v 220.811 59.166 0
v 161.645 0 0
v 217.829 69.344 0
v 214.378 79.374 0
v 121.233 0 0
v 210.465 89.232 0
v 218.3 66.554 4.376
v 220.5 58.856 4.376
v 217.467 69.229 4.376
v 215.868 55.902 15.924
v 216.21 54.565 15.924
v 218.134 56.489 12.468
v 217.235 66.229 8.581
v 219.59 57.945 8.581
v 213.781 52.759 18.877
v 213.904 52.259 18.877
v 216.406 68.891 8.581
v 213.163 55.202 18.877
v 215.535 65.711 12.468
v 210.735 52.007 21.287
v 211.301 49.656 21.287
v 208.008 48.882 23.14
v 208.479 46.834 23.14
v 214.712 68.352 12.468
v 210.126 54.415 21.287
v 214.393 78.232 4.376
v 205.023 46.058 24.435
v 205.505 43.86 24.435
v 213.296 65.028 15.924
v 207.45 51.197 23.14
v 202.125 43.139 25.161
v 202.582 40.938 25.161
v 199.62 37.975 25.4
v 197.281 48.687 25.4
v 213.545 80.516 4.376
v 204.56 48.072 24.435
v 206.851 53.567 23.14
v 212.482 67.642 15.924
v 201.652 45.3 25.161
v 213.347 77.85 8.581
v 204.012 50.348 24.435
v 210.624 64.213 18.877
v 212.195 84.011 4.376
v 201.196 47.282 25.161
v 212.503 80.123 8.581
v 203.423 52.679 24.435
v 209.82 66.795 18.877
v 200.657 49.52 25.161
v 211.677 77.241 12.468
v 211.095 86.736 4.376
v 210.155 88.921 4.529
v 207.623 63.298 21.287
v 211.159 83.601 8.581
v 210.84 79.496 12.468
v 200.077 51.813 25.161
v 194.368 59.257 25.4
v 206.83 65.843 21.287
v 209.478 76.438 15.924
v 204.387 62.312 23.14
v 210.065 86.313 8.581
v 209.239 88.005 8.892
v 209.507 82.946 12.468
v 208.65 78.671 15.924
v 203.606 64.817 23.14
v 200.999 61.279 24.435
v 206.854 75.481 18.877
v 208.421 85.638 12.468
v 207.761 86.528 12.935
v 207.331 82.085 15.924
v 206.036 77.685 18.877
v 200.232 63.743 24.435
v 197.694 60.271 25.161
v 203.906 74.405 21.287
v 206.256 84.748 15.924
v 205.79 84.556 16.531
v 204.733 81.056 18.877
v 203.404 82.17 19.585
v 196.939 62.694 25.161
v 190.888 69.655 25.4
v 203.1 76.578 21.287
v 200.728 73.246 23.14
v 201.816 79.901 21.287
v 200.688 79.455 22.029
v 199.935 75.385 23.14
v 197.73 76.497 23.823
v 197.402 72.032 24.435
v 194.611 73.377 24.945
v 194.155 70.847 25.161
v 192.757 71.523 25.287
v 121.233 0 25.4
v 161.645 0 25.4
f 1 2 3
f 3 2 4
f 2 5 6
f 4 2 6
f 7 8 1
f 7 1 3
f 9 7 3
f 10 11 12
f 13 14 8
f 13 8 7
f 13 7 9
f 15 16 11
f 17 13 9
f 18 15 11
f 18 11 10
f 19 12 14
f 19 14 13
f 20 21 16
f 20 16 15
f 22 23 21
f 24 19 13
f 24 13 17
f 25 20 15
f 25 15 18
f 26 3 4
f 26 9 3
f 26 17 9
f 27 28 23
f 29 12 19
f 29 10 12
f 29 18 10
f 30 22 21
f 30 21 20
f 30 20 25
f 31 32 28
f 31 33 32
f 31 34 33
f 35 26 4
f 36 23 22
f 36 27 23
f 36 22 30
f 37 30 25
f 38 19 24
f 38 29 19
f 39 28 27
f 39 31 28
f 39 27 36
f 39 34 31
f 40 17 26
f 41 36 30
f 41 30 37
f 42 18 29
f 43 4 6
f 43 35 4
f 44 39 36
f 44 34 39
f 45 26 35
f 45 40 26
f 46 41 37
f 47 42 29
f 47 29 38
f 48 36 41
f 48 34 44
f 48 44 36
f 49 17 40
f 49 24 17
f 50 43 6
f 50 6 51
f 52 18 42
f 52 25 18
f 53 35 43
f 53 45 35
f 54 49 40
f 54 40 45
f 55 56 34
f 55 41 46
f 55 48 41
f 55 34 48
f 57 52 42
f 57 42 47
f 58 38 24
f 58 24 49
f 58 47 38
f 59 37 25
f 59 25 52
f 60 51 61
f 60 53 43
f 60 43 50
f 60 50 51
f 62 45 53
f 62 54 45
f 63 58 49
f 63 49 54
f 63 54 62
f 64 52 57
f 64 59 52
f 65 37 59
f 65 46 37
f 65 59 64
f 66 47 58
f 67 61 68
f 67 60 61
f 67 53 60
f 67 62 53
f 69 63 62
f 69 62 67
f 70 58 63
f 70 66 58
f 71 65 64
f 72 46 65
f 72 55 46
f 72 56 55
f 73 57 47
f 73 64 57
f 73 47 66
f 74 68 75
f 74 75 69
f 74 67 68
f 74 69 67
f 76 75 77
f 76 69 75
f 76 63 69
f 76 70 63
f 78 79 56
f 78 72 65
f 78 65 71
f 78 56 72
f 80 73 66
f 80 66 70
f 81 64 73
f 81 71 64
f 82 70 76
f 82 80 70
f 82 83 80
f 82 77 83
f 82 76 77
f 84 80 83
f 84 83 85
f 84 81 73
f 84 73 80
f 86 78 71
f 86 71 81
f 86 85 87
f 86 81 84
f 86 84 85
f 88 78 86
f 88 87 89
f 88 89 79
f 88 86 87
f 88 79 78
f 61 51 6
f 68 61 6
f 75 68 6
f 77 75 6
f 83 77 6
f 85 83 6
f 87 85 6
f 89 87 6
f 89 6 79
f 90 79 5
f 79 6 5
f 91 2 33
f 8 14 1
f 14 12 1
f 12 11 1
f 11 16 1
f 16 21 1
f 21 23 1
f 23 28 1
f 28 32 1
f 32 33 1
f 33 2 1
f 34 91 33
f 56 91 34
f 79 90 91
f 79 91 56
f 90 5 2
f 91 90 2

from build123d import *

# Parameters (mm, degrees)
F2_DEPTH = 25.4
F3_R     = 25.39999


# Not quite as in the source:
# - a fillet or chamfer is up to 0.001 mm smaller than in the source, because OpenCascade refuses the exact size


with BuildPart() as f2:
    # F1 (on face) → F2 (new body)
    with BuildSketch(Plane.XY):
        with BuildLine():
            Line((210.4652929995, 89.2318353651), (121.2334576344, 0))
            Line((121.2334576344, 0), (161.6446101792, 0))
            Line((161.6446101792, 0), (220.8106438897, 59.1660337104))
            ThreePointArc((220.8106438897, 59.1660337104), (216.1613322086, 74.3790189354), (210.4652929995, 89.2318353651))
        make_face()
    extrude(amount=F2_DEPTH)

    # F3 (radius 25.4 in the source; OpenCascade refuses exactly that, so slightly less here)
    f3_edges = [f2.edges().sort_by_distance(p)[0] for p in [
        (216.161332, 74.379019, 25.4),
    ]]
    fillet(f3_edges, radius=F3_R)


solid = f2.part
